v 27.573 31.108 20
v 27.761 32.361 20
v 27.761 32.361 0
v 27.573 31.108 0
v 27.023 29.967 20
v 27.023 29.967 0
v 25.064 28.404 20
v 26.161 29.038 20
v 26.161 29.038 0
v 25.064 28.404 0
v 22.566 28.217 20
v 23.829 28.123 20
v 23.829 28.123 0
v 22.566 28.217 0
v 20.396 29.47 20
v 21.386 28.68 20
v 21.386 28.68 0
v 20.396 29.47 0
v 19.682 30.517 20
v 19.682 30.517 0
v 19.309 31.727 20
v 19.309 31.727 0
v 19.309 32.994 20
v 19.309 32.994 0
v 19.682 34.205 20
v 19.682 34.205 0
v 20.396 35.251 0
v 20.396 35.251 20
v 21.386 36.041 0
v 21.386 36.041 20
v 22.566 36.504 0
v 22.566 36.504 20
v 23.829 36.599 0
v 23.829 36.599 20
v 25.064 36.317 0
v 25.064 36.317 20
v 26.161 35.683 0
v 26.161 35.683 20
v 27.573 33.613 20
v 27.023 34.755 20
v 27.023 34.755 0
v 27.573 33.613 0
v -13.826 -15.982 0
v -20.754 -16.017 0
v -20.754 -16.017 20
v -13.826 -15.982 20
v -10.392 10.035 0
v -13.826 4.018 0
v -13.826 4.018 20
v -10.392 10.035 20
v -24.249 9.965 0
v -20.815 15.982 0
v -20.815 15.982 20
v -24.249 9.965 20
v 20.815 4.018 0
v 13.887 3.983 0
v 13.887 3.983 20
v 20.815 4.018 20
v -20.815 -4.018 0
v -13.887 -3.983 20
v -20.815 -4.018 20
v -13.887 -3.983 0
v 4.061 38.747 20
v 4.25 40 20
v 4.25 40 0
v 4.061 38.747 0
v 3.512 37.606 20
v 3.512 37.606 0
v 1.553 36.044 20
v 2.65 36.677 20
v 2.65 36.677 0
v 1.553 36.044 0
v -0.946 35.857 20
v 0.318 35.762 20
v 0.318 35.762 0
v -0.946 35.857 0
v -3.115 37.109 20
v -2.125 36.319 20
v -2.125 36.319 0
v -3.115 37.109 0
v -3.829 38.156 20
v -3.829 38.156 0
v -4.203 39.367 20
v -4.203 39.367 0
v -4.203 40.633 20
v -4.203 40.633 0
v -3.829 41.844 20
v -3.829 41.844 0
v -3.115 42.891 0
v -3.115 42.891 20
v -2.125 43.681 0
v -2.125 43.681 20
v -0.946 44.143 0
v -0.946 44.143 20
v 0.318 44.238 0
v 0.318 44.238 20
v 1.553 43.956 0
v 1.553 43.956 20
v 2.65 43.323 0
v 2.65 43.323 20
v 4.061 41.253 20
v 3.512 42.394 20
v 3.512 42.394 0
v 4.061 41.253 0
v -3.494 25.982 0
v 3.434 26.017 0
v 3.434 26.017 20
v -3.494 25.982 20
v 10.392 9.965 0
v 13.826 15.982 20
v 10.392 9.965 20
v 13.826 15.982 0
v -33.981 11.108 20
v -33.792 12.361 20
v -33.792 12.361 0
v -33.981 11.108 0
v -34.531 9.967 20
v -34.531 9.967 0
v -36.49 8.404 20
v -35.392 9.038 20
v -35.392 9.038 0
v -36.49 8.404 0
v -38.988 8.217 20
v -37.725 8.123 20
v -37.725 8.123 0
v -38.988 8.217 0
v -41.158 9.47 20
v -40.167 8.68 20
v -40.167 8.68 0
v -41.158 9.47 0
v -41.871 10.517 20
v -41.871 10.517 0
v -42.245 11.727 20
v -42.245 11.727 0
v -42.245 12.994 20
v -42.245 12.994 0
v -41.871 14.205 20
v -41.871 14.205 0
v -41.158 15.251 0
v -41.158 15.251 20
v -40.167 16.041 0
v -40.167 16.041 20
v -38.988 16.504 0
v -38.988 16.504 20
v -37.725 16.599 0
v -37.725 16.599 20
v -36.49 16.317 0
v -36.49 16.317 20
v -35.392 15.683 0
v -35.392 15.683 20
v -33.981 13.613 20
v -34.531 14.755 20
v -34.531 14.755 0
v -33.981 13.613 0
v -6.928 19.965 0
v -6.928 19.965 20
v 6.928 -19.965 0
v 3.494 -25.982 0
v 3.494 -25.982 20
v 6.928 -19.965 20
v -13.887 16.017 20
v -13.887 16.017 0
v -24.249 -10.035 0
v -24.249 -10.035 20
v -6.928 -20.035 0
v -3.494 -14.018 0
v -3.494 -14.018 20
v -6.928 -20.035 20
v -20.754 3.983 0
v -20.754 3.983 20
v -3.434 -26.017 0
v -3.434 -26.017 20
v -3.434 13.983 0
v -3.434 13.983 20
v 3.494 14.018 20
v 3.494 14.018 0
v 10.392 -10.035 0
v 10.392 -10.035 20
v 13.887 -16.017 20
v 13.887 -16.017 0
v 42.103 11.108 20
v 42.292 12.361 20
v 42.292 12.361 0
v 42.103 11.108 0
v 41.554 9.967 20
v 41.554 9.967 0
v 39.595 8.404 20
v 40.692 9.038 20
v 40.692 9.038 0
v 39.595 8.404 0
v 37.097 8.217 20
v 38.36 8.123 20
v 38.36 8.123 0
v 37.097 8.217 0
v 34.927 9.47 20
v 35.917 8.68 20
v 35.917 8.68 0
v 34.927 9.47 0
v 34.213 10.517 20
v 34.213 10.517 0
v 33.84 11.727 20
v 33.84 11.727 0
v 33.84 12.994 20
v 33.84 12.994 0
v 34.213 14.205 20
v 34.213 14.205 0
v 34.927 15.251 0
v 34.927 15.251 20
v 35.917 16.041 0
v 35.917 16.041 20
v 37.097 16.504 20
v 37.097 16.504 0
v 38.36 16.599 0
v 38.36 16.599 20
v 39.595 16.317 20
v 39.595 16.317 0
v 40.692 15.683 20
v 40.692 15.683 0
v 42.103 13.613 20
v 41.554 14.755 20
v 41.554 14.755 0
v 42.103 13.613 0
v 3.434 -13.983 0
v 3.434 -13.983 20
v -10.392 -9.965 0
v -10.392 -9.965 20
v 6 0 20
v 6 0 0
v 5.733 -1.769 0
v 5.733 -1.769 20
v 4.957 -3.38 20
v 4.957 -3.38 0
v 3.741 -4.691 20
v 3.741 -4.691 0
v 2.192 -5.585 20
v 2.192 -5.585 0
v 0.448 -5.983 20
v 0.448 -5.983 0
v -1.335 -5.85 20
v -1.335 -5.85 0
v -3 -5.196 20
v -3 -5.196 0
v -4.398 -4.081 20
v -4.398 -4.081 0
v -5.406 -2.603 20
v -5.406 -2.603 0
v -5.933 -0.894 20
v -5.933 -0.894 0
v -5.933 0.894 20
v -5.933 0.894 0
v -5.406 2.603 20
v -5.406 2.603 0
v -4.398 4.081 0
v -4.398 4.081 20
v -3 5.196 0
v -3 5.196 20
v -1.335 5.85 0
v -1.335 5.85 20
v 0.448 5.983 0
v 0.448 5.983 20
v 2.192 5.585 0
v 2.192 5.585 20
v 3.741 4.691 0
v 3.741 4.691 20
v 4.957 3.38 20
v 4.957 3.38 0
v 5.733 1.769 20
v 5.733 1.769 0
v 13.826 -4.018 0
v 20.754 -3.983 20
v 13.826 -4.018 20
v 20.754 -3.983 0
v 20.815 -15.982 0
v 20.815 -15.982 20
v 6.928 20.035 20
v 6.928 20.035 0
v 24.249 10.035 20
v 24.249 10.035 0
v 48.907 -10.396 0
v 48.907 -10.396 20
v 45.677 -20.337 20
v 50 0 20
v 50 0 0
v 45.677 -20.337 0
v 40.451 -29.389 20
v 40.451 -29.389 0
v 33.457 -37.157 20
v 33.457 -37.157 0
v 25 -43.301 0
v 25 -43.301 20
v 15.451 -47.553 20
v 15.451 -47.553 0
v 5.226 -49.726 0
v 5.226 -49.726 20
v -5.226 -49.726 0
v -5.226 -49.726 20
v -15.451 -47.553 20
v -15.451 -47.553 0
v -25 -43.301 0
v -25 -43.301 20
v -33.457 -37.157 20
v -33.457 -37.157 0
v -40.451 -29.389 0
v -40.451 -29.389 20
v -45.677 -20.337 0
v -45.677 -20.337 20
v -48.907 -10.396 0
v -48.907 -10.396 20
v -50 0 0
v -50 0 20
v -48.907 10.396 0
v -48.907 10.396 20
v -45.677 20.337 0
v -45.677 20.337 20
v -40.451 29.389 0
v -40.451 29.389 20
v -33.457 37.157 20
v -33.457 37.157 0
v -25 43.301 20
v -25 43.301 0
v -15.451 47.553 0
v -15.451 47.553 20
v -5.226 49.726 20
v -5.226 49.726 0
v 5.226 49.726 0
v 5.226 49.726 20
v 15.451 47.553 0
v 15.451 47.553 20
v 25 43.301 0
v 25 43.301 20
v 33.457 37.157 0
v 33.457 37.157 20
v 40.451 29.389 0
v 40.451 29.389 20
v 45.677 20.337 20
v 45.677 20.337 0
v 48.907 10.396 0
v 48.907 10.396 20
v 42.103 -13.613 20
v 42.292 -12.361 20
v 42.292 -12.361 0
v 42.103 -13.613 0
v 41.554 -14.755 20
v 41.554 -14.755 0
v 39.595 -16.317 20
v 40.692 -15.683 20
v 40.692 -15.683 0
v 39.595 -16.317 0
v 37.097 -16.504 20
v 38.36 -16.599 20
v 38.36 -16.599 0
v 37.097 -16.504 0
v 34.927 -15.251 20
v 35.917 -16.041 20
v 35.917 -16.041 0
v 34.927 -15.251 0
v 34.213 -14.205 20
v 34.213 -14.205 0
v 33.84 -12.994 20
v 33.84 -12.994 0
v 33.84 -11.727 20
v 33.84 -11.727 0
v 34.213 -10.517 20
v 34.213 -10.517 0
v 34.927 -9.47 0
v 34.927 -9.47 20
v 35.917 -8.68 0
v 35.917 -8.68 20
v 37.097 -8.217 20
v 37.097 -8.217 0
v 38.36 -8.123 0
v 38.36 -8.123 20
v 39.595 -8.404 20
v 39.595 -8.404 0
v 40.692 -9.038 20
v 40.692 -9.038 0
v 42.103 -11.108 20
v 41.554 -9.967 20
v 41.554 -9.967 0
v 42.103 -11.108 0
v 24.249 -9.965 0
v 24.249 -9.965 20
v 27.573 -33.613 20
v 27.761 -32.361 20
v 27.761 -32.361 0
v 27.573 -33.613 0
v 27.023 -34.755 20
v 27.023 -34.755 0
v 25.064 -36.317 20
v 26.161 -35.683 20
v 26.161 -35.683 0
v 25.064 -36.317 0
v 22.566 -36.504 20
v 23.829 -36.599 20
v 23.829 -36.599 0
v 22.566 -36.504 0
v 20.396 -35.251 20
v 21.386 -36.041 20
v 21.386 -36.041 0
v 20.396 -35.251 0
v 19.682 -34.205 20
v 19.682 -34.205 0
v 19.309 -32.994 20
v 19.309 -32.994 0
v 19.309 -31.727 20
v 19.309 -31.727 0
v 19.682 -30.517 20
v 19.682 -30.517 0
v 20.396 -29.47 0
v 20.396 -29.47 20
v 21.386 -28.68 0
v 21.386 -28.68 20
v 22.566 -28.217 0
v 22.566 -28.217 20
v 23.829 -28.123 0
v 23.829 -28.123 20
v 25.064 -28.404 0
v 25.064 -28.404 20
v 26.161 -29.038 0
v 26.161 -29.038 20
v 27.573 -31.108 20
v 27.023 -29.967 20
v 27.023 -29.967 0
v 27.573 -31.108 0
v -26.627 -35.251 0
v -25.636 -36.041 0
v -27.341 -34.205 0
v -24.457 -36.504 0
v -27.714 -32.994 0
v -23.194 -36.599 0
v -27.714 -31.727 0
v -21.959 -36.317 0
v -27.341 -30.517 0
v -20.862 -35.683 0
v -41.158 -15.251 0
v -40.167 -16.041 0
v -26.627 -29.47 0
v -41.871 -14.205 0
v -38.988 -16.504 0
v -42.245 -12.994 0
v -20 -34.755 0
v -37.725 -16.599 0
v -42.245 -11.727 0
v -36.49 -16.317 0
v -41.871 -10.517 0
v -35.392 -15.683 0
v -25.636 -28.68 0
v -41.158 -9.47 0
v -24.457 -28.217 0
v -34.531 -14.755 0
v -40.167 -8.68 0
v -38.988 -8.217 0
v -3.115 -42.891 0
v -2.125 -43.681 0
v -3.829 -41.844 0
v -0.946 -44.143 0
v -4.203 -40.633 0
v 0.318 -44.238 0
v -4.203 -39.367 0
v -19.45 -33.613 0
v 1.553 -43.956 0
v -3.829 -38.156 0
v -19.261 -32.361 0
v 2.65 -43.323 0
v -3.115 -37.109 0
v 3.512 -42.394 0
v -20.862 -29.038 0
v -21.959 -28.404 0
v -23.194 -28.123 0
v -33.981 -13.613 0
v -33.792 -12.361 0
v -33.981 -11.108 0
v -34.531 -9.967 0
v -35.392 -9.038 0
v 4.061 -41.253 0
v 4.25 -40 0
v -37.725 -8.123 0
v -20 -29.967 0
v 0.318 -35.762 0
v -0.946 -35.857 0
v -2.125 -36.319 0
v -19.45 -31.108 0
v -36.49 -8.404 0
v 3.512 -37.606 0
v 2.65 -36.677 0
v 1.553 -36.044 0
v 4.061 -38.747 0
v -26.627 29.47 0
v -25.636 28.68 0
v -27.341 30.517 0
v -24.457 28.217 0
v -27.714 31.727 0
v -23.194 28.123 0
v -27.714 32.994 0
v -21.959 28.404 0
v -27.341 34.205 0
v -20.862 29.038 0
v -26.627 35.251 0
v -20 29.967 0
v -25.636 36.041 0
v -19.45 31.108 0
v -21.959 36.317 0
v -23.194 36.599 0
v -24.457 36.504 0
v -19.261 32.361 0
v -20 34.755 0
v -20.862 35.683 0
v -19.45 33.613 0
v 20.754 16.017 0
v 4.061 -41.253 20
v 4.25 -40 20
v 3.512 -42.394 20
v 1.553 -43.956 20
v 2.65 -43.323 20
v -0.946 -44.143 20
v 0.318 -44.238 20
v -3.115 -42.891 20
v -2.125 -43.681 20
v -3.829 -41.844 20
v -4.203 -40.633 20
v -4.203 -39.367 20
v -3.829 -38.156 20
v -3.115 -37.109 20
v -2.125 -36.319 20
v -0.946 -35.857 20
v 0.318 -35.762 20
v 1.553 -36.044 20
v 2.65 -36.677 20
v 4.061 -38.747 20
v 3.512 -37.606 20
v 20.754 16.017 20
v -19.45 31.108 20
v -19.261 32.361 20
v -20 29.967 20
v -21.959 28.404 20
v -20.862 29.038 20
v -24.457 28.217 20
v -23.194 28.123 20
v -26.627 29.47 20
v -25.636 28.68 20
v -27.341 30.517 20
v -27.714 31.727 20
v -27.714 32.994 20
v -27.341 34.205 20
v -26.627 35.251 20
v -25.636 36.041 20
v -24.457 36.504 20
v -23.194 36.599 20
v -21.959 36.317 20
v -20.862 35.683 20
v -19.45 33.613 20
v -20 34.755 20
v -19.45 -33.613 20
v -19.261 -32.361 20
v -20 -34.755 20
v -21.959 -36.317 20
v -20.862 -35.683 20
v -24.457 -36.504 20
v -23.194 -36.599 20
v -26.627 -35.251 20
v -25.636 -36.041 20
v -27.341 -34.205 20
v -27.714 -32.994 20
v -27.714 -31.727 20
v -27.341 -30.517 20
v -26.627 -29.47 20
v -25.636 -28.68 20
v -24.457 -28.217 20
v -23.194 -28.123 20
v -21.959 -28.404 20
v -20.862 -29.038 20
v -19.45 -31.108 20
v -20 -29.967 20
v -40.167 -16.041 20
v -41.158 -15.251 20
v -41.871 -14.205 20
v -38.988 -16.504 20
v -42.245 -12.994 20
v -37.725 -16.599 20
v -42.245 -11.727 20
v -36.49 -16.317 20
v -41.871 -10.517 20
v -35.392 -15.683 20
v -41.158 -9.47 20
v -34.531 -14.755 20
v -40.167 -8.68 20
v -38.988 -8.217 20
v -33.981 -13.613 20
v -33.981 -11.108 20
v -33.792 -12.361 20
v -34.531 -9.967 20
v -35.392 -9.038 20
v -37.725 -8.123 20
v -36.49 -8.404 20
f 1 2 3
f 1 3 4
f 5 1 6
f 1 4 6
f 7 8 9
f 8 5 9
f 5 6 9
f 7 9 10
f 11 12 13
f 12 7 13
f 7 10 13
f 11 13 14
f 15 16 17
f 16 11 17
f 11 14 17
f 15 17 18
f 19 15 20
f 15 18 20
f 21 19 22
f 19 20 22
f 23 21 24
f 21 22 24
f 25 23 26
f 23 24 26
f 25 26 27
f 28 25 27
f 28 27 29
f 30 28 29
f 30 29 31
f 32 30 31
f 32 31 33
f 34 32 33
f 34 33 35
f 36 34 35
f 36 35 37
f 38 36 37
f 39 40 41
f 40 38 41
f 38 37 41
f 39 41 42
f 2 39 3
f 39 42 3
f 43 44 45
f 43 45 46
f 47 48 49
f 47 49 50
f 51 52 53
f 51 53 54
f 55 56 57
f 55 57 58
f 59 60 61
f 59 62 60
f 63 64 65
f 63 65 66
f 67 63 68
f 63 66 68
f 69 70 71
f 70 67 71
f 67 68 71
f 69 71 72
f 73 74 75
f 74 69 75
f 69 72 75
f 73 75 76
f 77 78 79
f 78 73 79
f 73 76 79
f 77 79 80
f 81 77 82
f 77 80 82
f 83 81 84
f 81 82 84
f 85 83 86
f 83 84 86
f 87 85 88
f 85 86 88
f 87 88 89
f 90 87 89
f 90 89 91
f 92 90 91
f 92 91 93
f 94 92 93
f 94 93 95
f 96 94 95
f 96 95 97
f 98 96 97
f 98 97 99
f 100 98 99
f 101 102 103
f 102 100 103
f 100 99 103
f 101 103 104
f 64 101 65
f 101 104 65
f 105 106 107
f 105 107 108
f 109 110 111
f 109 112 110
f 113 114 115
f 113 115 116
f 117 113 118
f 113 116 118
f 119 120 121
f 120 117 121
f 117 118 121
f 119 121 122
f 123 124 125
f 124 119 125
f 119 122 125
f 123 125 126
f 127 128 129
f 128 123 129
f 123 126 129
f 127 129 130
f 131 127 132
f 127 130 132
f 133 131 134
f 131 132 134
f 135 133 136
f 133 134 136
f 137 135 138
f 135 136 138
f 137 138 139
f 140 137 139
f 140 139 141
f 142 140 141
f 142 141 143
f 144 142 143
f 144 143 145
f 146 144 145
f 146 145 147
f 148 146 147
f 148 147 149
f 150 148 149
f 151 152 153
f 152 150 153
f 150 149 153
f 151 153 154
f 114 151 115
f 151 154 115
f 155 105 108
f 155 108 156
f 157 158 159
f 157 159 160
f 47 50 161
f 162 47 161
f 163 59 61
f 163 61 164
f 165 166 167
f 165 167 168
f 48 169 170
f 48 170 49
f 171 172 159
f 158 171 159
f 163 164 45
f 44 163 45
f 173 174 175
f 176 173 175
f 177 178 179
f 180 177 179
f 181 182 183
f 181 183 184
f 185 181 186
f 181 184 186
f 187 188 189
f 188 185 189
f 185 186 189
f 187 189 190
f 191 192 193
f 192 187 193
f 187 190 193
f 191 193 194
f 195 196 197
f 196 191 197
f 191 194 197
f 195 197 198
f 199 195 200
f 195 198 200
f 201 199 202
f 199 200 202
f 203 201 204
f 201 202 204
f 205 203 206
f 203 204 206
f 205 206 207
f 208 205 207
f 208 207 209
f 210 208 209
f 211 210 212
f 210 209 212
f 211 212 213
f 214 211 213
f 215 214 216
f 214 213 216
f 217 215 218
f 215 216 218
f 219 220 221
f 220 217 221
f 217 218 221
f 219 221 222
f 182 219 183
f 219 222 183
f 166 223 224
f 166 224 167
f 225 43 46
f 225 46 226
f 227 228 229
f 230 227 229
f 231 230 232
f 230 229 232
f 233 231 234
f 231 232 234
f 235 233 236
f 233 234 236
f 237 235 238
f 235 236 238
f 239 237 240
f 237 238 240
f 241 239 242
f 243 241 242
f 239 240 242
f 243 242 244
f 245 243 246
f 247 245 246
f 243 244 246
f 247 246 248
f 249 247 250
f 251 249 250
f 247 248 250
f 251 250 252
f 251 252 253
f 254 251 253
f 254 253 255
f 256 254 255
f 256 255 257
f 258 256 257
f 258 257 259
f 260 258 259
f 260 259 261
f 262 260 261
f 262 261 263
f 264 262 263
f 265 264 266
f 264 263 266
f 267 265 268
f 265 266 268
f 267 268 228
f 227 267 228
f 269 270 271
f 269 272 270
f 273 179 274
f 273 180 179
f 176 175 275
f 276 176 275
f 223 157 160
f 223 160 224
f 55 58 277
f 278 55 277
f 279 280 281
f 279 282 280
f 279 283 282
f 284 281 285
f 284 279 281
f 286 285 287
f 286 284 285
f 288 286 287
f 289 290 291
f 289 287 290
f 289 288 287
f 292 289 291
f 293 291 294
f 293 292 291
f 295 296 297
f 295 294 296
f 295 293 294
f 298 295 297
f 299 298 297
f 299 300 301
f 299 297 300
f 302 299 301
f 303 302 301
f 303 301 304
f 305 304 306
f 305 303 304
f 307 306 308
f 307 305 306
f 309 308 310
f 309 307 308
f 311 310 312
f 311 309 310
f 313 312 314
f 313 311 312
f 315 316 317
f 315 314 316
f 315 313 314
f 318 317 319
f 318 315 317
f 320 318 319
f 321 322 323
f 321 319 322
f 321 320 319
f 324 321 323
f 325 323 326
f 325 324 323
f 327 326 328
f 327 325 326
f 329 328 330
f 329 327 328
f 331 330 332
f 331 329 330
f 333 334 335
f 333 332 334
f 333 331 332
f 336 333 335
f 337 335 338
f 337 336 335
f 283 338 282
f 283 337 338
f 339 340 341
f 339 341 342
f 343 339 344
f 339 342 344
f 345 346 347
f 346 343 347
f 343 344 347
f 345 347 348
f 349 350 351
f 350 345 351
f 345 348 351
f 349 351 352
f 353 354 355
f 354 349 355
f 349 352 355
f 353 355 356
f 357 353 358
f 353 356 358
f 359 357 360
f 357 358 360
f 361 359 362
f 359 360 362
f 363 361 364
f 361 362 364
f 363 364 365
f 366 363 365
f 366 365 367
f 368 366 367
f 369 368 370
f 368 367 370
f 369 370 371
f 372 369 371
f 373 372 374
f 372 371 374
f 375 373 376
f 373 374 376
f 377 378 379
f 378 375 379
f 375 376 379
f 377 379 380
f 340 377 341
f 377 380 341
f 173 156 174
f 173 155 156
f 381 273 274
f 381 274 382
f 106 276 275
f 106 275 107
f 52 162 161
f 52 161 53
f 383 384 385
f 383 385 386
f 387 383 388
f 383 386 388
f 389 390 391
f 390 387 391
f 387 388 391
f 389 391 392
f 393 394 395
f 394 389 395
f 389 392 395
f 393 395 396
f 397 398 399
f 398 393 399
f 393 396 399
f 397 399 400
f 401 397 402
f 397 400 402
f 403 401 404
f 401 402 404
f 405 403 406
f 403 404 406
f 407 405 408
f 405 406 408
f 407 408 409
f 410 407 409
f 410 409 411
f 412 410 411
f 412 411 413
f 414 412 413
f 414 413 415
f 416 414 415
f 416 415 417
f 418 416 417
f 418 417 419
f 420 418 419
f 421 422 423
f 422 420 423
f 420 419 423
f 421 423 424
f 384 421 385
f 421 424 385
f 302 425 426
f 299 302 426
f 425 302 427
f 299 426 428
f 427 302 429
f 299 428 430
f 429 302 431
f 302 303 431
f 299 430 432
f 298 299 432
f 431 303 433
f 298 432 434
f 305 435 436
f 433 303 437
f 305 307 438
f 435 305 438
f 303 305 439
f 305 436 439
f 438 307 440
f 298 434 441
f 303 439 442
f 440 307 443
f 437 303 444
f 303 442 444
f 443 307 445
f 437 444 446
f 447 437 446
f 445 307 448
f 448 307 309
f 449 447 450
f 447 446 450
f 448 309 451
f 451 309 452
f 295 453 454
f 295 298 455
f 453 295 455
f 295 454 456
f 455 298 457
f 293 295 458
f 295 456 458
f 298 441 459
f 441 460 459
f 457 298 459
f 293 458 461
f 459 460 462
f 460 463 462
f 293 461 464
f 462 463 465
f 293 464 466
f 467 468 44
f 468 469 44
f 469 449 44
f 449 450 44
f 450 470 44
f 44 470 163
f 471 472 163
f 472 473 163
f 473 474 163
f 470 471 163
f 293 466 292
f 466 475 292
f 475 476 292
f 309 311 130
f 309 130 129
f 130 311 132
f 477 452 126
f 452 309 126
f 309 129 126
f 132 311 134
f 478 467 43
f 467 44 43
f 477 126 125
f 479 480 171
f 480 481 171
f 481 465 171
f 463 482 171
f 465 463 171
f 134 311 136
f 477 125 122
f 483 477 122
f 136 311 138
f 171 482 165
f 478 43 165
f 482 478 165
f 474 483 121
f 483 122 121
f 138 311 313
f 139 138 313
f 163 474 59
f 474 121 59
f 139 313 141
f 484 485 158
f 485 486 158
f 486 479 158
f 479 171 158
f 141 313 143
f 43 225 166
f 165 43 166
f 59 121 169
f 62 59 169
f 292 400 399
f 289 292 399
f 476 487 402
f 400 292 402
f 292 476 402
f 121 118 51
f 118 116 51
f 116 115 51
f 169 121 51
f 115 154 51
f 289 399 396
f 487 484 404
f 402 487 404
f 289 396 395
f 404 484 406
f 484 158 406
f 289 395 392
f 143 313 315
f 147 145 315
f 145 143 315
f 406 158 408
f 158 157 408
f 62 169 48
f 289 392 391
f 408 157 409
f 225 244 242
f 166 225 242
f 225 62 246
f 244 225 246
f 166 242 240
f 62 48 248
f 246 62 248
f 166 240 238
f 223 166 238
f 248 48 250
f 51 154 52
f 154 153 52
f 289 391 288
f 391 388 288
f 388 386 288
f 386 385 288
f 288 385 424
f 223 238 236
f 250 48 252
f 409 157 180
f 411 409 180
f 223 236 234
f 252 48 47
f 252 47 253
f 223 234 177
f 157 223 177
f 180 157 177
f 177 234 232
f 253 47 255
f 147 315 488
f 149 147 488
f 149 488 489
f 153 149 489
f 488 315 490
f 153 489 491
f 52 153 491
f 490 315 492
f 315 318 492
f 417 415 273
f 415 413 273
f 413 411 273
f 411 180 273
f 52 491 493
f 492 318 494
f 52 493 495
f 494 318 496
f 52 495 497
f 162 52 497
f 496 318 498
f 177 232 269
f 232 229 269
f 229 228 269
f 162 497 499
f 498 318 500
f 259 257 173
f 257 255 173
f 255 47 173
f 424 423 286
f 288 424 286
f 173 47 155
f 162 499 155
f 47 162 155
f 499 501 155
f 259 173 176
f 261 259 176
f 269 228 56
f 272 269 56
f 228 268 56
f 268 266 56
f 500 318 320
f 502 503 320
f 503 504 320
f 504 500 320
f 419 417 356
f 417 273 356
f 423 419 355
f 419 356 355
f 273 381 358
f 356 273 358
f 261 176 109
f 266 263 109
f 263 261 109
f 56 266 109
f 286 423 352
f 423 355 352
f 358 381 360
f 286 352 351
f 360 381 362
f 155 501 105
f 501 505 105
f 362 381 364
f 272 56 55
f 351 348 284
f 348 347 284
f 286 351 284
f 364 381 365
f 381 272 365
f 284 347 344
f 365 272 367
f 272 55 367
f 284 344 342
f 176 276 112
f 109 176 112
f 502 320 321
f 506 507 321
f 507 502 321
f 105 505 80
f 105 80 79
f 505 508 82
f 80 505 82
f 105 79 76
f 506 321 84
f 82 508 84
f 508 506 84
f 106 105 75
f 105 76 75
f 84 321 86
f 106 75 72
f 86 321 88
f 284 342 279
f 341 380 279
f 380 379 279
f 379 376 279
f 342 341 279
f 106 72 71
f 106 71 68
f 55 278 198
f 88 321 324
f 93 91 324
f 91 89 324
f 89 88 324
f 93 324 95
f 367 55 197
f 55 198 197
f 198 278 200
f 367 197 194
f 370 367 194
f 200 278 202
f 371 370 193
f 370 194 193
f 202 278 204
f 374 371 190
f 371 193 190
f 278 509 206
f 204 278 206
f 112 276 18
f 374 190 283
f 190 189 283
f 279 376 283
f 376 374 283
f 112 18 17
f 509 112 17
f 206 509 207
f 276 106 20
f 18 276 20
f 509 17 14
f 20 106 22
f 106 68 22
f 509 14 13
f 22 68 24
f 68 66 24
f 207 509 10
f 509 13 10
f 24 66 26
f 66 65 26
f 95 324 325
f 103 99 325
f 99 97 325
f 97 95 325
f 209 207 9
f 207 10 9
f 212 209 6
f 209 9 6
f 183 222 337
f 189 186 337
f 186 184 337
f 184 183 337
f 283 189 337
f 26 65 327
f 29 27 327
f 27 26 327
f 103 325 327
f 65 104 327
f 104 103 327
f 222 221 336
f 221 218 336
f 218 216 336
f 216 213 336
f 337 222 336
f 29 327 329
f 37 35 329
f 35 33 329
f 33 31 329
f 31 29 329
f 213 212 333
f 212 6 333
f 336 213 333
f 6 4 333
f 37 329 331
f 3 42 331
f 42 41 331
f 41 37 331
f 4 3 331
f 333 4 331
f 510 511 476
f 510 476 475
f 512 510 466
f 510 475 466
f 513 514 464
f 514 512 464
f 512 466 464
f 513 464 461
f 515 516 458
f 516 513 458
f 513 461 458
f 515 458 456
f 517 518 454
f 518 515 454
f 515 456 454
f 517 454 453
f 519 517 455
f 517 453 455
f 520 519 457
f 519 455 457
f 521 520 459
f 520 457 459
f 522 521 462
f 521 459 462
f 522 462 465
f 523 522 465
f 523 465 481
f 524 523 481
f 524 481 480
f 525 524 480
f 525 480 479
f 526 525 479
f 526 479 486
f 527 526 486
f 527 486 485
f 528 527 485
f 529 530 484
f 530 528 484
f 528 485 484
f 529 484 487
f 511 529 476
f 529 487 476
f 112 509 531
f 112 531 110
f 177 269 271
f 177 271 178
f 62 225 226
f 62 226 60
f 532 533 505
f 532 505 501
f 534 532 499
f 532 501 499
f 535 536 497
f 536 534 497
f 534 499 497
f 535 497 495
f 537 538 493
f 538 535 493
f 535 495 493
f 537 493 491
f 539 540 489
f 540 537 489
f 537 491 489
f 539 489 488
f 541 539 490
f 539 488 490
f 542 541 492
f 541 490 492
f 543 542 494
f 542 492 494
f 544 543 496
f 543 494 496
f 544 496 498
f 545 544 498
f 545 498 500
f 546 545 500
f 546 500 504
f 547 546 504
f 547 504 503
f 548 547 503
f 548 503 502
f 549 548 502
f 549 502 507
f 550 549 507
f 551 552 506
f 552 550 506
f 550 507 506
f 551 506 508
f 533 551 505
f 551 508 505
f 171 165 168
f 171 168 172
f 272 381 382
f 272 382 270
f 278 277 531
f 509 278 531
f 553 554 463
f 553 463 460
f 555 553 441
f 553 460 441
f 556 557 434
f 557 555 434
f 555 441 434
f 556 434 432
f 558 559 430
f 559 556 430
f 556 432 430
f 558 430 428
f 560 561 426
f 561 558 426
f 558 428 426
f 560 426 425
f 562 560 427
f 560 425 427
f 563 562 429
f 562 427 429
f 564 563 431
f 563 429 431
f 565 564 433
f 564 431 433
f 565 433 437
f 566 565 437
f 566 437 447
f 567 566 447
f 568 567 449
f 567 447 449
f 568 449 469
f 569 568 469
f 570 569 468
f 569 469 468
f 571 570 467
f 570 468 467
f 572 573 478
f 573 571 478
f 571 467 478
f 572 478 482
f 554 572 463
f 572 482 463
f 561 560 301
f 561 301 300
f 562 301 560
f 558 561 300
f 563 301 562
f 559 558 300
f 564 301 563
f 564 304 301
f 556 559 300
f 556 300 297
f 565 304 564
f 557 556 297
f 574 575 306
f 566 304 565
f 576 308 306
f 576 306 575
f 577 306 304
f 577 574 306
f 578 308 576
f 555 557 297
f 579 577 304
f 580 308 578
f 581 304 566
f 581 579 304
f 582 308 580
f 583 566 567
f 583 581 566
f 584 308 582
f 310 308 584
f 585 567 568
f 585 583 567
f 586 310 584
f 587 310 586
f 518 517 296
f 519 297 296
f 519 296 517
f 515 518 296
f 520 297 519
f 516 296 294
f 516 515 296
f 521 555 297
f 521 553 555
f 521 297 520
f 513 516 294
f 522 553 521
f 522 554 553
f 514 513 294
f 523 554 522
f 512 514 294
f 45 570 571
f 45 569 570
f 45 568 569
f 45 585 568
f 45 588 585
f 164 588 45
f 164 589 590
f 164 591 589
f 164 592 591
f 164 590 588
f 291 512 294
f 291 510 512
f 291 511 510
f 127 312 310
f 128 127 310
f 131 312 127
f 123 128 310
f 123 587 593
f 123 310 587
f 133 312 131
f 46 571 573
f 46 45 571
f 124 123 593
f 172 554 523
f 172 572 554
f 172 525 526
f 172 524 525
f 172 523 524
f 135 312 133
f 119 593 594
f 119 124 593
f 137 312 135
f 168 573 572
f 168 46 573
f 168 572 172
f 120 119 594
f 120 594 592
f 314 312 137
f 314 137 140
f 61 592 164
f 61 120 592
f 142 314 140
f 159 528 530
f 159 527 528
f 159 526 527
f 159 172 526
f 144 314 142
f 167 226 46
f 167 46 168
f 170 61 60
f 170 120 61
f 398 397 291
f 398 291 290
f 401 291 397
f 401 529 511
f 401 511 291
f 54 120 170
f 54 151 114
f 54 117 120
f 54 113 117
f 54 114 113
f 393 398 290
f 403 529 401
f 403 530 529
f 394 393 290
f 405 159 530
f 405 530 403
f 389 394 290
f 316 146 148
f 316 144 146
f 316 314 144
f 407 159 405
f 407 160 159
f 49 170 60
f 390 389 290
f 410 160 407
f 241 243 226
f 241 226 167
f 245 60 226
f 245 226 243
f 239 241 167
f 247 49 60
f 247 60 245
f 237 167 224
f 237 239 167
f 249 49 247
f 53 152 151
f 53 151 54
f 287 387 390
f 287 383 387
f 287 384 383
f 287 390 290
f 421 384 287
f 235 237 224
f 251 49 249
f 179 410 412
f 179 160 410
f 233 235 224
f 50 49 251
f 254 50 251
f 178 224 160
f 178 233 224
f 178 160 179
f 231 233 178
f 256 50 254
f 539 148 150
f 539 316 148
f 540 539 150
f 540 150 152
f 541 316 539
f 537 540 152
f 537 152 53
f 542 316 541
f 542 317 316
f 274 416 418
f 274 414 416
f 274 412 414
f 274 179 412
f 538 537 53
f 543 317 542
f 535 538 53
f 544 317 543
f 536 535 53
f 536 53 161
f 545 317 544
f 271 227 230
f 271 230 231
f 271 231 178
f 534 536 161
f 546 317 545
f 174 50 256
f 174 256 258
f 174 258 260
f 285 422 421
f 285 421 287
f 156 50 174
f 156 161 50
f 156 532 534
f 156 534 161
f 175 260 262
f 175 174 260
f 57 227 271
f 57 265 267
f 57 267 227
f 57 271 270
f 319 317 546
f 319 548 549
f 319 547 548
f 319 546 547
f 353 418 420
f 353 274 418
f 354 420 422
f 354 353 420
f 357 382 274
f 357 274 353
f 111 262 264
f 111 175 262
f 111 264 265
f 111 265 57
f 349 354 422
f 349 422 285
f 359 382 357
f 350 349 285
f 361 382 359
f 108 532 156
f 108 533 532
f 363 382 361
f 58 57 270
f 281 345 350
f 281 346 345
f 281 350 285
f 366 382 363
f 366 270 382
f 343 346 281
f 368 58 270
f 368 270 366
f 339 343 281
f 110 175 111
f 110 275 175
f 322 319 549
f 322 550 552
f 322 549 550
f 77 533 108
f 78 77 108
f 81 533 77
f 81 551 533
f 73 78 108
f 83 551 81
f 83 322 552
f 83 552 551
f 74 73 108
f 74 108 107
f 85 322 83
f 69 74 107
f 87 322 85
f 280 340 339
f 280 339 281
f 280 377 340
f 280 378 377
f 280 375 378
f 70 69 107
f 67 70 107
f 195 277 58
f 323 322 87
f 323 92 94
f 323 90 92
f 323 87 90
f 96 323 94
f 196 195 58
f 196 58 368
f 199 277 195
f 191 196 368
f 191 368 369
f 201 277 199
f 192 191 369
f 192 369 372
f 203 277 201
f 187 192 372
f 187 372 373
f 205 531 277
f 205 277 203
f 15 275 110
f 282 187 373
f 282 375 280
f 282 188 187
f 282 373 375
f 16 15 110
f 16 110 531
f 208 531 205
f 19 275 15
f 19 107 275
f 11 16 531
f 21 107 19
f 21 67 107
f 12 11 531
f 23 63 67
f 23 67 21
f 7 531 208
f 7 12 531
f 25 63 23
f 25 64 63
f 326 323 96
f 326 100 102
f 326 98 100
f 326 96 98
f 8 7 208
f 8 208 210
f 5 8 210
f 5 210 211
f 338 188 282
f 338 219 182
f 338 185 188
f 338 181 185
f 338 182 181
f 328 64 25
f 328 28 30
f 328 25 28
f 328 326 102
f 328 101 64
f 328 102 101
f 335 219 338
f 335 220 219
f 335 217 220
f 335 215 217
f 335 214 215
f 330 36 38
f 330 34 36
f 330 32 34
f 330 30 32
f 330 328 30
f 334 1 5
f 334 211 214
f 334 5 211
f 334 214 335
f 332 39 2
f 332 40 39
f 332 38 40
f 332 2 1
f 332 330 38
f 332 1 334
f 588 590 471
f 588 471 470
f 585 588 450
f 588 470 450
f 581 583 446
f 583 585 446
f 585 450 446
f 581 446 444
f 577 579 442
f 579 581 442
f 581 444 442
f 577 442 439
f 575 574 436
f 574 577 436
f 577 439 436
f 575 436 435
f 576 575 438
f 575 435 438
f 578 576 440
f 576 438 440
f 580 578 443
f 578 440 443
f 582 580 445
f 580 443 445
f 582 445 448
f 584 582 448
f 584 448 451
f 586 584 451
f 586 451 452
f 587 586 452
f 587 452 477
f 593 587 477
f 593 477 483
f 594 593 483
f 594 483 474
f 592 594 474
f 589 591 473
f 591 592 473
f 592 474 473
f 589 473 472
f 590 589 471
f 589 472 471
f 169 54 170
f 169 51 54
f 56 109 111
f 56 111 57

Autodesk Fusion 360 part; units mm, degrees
sketch "Sketch1" plane through (0, 0, 0) normal (0, 0, 1) x (1, 0, 0)
  circle A0 centre (0, 0) radius 50
  circle A1 centre (0, 40) radius 4.25
  circle A2 centre (-23.5114, 32.3607) radius 4.25
  circle A3 centre (-38.0423, 12.3607) radius 4.25
  circle A4 centre (-38.0423, -12.3607) radius 4.25
  circle A5 centre (-23.5114, -32.3607) radius 4.25
  circle A6 centre (0, -40) radius 4.25
  circle A7 centre (23.5114, -32.3607) radius 4.25
  circle A8 centre (38.0423, -12.3607) radius 4.25
  circle A9 centre (38.0423, 12.3607) radius 4.25
  circle A10 centre (23.5114, 32.3607) radius 4.25
  line L0 (-3.4339, 13.9827) -> (3.4942, 14.0175)
  line L1 (3.4942, 14.0175) -> (6.9281, 20.0348)
  line L2 (6.9281, 20.0348) -> (3.4339, 26.0173)
  line L3 (3.4339, 26.0173) -> (-3.4942, 25.9825)
  line L4 (-3.4942, 25.9825) -> (-6.9281, 19.9652)
  line L5 (-6.9281, 19.9652) -> (-3.4339, 13.9827)
  line L6 (-20.7544, 3.9827) -> (-13.8263, 4.0175)
  line L7 (-13.8263, 4.0175) -> (-10.3924, 10.0348)
  line L8 (-10.3924, 10.0348) -> (-13.8866, 16.0173)
  line L9 (-13.8866, 16.0173) -> (-20.8147, 15.9825)
  line L10 (-24.2486, 9.9652) -> (-20.7544, 3.9827)
  line L11 (-20.8147, 15.9825) -> (-24.2486, 9.9652)
  line L12 (-13.8263, -15.9825) -> (-10.3924, -9.9652)
  line L13 (-10.3924, -9.9652) -> (-13.8866, -3.9827)
  line L14 (-13.8866, -3.9827) -> (-20.8147, -4.0175)
  line L15 (-20.8147, -4.0175) -> (-24.2486, -10.0348)
  line L16 (-20.7544, -16.0173) -> (-13.8263, -15.9825)
  line L17 (-24.2486, -10.0348) -> (-20.7544, -16.0173)
  line L18 (6.9281, -19.9652) -> (3.4339, -13.9827)
  line L19 (3.4339, -13.9827) -> (-3.4942, -14.0175)
  line L20 (-3.4942, -14.0175) -> (-6.9281, -20.0348)
  line L21 (-6.9281, -20.0348) -> (-3.4339, -26.0173)
  line L22 (3.4942, -25.9825) -> (6.9281, -19.9652)
  line L23 (-3.4339, -26.0173) -> (3.4942, -25.9825)
  line L24 (20.7544, -3.9827) -> (13.8263, -4.0175)
  line L25 (13.8263, -4.0175) -> (10.3924, -10.0348)
  line L26 (10.3924, -10.0348) -> (13.8866, -16.0173)
  line L27 (13.8866, -16.0173) -> (20.8147, -15.9825)
  line L28 (24.2486, -9.9652) -> (20.7544, -3.9827)
  line L29 (20.8147, -15.9825) -> (24.2486, -9.9652)
  line L30 (13.8263, 15.9825) -> (10.3924, 9.9652)
  line L31 (10.3924, 9.9652) -> (13.8866, 3.9827)
  line L32 (13.8866, 3.9827) -> (20.8147, 4.0175)
  line L33 (20.8147, 4.0175) -> (24.2486, 10.0348)
  line L34 (20.7544, 16.0173) -> (13.8263, 15.9825)
  line L35 (24.2486, 10.0348) -> (20.7544, 16.0173)
  circle A11 centre (0, 0) radius 6
  point P0 (0, 20)
  dimension "d3" = 100
  dimension "d4" = 8.5
  dimension "d5" = 40
  dimension "d7" = 360
  dimension "d9" = 6
  dimension "d10" = 20
  dimension "d12" = 360
  dimension "d16" = 12
extrude "Extrude1" add sketch "Sketch1" along normal blind 20 contours A0 | A11 makes body 1
copy_body "Body->Comp1" bodies 1 removing the originals makes body 2 in component "Component"
extrude "Extrude1'" cut sketch "Sketch1" along normal blind 21.019 contours A11 bodies 2 in component "Component"
component "Component" placed x (1, 0, 0) y (0, 1, 0) z (0, 0, 1) at (0, 0, 0)
equation "Reaktion_Durchmesser = 120 mm"
equation "M8_Durchmesser = 8.5 mm"
equation "d4 = M8_Durchmesser"
equation "Plygon_D = 6 mm"
equation "wheel_hohe = 20 mm"
equation "d14 = wheel_hohe"
